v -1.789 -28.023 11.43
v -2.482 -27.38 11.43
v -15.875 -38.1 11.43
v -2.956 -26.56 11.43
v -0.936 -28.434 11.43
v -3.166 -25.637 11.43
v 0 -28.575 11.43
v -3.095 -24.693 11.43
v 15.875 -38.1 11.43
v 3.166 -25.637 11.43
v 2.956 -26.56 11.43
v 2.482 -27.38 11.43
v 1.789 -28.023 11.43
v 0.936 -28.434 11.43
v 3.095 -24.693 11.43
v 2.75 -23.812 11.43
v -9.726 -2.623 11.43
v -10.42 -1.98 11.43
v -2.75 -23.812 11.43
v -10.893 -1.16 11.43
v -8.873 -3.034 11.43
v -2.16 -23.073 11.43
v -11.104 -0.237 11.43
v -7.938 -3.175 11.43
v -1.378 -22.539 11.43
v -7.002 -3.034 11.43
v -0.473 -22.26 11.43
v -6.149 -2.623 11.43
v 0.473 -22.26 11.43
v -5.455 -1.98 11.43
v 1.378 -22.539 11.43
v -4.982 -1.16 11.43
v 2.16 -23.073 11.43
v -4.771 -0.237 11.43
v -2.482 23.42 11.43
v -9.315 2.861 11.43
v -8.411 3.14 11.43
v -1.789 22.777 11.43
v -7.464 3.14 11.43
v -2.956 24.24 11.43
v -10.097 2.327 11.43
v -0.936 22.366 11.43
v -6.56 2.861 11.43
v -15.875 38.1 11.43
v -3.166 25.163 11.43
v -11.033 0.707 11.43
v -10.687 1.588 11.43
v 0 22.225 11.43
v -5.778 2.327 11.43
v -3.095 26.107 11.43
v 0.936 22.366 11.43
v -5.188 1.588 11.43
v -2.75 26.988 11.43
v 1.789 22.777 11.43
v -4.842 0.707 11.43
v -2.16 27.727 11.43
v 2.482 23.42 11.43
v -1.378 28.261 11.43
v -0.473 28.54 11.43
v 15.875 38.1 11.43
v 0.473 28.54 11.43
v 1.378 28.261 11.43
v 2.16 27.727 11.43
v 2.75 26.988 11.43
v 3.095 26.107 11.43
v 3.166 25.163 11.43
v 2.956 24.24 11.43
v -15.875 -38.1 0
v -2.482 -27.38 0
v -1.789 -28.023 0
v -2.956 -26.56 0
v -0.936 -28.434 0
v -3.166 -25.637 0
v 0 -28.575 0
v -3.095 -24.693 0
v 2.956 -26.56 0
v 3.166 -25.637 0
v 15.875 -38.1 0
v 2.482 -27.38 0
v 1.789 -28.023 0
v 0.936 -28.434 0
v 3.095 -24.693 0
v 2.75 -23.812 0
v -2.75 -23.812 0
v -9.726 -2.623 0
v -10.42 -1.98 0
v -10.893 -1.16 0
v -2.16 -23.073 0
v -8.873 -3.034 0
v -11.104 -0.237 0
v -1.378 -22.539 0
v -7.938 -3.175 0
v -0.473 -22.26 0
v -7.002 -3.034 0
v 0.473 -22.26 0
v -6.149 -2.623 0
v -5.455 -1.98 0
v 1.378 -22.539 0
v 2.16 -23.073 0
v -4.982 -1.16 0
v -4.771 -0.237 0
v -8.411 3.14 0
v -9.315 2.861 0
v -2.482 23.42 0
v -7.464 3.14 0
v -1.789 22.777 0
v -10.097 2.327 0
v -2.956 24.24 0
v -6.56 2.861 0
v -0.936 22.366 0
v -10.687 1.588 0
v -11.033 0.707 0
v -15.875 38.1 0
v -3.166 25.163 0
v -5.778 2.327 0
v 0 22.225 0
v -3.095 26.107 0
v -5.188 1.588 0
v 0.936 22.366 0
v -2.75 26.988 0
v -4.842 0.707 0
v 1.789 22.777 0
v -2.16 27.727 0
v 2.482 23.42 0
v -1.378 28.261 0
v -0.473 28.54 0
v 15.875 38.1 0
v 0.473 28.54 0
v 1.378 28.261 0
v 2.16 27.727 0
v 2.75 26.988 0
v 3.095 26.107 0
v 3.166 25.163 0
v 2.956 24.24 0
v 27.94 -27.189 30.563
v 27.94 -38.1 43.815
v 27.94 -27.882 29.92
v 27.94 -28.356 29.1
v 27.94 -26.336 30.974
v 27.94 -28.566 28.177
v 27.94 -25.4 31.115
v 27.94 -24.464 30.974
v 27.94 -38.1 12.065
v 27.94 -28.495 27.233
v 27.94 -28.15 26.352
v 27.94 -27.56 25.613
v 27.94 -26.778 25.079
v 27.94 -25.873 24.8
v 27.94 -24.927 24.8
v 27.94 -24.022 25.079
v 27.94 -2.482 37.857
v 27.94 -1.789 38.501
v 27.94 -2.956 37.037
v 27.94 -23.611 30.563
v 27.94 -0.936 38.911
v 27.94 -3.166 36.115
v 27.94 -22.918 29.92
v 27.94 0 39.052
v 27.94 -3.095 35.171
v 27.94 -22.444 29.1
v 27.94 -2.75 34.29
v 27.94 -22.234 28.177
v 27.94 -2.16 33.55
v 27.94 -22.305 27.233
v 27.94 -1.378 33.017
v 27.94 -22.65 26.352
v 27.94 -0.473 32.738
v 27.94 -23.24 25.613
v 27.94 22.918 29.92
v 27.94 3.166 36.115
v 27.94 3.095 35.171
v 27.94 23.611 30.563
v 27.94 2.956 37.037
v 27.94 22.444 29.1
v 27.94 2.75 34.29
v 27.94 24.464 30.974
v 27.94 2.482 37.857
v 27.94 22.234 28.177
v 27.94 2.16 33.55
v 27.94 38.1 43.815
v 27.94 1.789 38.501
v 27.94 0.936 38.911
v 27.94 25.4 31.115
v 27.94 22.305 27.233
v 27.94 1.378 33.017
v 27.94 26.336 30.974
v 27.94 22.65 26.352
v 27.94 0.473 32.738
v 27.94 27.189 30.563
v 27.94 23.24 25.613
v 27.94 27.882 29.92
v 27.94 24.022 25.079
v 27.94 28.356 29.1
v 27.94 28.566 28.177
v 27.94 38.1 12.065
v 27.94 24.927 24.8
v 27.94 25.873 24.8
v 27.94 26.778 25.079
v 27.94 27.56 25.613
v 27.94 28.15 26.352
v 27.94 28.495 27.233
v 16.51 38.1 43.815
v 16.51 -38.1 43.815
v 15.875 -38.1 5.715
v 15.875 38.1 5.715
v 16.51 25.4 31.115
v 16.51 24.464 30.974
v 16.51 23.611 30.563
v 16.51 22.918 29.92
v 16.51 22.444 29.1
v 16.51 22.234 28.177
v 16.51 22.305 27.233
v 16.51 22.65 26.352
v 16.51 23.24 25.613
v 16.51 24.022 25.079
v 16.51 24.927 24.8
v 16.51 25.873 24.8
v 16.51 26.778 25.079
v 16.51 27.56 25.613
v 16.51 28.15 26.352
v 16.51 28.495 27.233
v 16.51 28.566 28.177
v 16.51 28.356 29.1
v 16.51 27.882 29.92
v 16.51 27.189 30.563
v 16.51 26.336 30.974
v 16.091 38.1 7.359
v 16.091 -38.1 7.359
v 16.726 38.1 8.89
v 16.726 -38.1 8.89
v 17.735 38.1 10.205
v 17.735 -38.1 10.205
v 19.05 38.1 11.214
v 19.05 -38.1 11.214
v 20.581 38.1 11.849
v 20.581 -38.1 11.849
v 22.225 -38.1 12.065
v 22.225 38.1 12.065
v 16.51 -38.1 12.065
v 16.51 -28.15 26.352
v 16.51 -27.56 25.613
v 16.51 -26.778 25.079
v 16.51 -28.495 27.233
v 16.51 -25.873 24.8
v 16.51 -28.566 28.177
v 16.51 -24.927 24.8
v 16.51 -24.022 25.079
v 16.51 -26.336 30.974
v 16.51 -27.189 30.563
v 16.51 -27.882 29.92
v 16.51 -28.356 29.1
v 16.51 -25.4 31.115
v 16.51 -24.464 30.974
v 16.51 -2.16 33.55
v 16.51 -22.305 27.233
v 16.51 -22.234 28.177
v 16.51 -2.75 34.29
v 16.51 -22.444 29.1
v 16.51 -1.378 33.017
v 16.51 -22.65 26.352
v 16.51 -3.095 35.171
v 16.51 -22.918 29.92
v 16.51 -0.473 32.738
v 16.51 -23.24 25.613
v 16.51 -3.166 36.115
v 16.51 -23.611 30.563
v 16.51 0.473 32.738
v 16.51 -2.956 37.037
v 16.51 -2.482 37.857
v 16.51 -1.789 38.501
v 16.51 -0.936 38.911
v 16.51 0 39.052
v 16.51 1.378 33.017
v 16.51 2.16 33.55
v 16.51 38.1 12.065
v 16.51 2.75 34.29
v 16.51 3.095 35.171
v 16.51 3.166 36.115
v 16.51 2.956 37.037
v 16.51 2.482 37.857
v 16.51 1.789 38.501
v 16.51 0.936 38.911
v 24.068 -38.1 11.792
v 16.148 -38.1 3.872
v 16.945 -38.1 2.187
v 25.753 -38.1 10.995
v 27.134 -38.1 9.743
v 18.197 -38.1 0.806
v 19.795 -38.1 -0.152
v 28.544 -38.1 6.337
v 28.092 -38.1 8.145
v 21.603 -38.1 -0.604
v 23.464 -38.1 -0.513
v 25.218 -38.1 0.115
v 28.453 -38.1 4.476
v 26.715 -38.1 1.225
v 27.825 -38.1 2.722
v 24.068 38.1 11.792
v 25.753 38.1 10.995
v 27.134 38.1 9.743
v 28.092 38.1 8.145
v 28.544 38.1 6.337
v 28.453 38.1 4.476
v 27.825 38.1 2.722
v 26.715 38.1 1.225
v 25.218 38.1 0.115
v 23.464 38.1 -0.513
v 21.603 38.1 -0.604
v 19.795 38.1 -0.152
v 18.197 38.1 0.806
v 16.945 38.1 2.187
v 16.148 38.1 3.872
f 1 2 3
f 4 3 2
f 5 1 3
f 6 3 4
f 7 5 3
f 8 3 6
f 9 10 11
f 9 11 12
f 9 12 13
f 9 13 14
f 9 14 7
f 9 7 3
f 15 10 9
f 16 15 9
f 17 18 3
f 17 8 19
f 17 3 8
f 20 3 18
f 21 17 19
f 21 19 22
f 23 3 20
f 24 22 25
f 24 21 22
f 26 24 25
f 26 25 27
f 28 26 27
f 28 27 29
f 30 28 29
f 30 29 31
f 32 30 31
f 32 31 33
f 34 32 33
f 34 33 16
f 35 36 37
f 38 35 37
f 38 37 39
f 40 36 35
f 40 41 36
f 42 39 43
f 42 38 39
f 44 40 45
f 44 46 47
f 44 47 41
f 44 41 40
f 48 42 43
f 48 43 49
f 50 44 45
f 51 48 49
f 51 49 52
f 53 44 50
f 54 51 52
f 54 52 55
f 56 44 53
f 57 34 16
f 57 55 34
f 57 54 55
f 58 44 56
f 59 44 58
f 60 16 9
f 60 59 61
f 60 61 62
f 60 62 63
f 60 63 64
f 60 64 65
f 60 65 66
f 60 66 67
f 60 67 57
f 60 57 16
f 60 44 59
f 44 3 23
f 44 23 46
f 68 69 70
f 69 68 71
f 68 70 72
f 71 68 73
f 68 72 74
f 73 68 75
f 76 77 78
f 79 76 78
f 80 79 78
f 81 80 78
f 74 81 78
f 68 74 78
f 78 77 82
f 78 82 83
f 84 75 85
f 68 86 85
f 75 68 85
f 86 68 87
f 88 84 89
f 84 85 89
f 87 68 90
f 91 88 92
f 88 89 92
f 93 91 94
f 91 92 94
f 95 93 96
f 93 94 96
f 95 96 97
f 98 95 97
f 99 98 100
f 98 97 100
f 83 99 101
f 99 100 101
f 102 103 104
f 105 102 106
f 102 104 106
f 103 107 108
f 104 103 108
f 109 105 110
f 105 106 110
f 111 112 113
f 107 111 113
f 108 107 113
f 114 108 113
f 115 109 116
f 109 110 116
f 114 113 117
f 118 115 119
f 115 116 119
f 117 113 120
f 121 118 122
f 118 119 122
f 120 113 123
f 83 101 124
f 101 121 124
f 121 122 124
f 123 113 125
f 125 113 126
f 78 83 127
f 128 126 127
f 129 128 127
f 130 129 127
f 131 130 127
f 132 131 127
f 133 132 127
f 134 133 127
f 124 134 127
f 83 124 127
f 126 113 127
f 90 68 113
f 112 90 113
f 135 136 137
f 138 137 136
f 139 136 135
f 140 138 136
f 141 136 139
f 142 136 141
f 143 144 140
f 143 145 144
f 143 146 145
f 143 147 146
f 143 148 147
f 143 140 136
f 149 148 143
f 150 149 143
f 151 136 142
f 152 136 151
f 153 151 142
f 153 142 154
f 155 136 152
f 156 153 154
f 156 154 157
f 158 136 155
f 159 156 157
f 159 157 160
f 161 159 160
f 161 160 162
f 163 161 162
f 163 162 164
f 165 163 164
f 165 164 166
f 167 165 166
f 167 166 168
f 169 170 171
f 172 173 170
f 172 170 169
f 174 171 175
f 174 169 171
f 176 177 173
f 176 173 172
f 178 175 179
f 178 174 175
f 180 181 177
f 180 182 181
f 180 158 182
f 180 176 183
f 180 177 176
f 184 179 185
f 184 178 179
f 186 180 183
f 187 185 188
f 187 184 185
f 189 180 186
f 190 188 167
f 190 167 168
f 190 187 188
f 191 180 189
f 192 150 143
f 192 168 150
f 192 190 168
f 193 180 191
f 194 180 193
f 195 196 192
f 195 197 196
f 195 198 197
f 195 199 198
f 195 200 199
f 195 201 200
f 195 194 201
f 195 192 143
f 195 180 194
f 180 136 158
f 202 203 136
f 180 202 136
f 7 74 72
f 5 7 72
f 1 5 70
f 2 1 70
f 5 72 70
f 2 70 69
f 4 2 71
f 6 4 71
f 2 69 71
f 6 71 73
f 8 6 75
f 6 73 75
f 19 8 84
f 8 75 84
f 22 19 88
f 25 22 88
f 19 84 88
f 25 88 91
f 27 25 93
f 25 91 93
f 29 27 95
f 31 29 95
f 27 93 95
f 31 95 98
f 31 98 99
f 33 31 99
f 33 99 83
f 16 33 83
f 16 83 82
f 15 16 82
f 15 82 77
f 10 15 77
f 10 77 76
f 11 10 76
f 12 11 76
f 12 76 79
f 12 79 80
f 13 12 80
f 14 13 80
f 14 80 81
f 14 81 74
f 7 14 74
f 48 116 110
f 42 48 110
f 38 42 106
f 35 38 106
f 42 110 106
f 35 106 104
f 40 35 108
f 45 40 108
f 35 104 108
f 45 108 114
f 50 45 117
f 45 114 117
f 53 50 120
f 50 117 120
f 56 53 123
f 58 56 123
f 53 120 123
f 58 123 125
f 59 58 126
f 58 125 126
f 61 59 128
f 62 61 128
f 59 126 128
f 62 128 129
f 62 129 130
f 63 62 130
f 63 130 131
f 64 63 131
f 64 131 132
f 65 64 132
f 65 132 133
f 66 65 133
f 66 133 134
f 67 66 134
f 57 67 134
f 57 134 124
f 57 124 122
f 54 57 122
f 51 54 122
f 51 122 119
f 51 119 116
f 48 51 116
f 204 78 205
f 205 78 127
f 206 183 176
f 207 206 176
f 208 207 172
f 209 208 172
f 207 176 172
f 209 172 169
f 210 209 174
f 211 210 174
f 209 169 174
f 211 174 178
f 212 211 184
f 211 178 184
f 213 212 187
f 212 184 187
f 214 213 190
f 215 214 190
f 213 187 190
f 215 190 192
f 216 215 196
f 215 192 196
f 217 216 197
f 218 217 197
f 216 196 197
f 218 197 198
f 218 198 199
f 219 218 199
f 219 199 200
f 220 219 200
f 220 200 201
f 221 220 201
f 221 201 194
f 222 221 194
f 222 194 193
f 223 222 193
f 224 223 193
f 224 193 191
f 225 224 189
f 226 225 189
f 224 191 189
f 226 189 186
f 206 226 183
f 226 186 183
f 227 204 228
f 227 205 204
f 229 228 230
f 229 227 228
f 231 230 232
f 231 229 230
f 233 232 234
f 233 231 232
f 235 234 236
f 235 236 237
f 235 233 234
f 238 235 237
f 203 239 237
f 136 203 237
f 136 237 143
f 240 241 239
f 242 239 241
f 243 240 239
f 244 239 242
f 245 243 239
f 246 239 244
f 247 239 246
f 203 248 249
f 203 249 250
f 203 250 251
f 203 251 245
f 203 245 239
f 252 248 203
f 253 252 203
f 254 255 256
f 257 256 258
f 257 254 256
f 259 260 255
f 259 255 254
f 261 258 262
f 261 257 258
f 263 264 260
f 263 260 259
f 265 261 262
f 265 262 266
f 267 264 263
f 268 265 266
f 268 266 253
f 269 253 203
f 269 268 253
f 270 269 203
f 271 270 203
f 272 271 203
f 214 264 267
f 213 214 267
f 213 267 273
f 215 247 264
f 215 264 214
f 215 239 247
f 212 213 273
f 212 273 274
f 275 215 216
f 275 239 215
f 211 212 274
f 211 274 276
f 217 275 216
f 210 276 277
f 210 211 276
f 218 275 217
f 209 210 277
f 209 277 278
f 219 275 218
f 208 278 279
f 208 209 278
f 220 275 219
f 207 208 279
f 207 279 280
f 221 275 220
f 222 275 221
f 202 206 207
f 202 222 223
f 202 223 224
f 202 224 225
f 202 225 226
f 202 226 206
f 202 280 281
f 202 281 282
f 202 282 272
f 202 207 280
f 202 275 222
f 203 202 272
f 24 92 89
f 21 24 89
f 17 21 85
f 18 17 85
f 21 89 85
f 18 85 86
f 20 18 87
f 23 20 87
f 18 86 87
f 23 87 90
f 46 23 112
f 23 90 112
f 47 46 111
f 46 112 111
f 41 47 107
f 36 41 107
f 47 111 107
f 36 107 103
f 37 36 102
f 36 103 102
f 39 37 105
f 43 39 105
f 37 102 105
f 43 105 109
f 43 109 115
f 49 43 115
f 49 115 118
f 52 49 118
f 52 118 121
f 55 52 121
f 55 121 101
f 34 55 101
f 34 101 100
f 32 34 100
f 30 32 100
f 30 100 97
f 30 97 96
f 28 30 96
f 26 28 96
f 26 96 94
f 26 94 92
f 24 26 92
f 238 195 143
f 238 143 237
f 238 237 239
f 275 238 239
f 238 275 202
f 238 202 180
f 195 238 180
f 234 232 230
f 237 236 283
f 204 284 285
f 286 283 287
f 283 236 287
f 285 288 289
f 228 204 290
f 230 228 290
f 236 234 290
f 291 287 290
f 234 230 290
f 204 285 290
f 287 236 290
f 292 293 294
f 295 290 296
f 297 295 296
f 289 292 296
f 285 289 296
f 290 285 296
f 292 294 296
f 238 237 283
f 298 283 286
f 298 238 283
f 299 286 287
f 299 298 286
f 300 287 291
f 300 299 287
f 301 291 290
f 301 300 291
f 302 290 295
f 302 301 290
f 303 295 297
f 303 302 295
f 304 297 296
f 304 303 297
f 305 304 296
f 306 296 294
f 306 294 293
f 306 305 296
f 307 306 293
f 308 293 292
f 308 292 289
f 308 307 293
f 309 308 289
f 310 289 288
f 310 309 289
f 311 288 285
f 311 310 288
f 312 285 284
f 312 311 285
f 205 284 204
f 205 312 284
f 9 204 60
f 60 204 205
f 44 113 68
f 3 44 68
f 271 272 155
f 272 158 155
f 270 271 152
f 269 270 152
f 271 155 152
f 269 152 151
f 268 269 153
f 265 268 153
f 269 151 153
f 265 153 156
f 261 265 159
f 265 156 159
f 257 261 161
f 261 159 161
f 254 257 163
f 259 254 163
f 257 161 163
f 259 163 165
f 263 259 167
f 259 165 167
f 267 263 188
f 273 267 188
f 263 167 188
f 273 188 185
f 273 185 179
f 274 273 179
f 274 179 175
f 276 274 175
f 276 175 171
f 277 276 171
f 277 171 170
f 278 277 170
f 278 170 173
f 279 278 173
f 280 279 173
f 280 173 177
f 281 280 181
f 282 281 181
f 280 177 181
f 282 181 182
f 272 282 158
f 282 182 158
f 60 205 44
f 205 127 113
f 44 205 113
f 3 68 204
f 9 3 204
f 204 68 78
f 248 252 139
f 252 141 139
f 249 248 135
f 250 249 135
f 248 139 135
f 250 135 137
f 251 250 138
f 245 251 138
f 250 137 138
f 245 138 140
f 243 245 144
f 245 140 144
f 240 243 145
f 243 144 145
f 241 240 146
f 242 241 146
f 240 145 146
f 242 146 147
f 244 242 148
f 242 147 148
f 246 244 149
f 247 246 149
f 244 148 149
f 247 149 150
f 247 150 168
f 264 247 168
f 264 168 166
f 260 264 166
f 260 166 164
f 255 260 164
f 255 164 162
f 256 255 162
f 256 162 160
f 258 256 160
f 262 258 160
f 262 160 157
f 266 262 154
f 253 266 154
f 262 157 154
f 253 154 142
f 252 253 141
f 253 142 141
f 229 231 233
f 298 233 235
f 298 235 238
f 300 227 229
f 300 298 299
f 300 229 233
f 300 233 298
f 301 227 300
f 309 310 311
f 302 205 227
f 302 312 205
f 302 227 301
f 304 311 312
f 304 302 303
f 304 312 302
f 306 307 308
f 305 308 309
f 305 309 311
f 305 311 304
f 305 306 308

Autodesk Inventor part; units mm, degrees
ref_plane "YZ Plane" through (0, 0, 0) normal (1, 0, 0) x (0, 1, 0)
ref_plane "XZ Plane" through (0, 0, 0) normal (0, 1, 0) x (-1, 0, 0)
ref_plane "XY Plane" through (0, 0, 0) normal (0, 0, 1) x (1, 0, 0)
sketch "Sketch1" plane through (0, 0, 0) normal (0, 0, 1) x (1, 0, 0)
  line L0 (-15.875, -38.1) -> (15.875, -38.1)
  line L1 (15.875, -38.1) -> (15.875, 38.1)
  line L2 (15.875, 38.1) -> (-15.875, 38.1)
  line L3 (-15.875, 38.1) -> (-15.875, -38.1)
  line L4 (-15.875, -38.1) -> (15.875, 38.1) construction
  line L5 (15.875, -38.1) -> (-15.875, 38.1) construction
  point P0 (0, 0)
  dimension "d0" = 76.2
  dimension "d1" = 31.75
extrude "Extrusion1" add sketch "Sketch1" along normal blind 11.43
sketch "Sketch2" plane through (-15.875, 38.1, 0) normal (0, 1, 0) x (1, 0, 0)
  circle A0 centre (38.1, -5.715) radius 6.35
  line L0 (0, 0) -> (0, -11.43) projected
  line L1 (31.75, 0) -> (31.75, -11.43) projected
  line L2 (32.385, -43.815) -> (43.815, -43.815)
  line L3 (43.815, -43.815) -> (43.815, -12.065)
  line L4 (43.815, -12.065) -> (32.385, -12.065)
  line L5 (32.385, -12.065) -> (32.385, -43.815)
  line L6 (32.385, -43.815) -> (43.815, -12.065) construction
  line L7 (43.815, -43.815) -> (32.385, -12.065) construction
  point P0 (15.875, 0)
  point P1 (0, -5.715)
  point P2 (31.75, -5.715)
  point P3 (31.75, -5.715)
  point P4 (38.1, -27.94)
  point P5 (38.1, -12.065)
  point P6 (31.75, -5.715)
  point P7 (38.1, -27.94)
  dimension "d4" = 12.7
  dimension "d5" = 31.75
  dimension "d6" = 11.43
extrude "Extrusion2" add sketch "Sketch2" against normal blind 76.2
sketch "Sketch3" plane through (0, 0, 11.43) normal (0, 0, 1) x (1, 0, 0)
  circle A0 centre (-7.9375, 0) radius 3.175
  circle A1 centre (0, 25.4) radius 3.175
  circle A2 centre (0, -25.4) radius 3.175
  point P0 (0, 0)
  dimension "d9" = 6.35
  dimension "d10" = 7.9375
  dimension "d11" = 6.35
  dimension "d12" = 6.35
  dimension "d13" = 25.4
  dimension "d14" = 25.4
sketch "Sketch4" plane through (16.51, 38.1, 12.065) normal (-1, 0, 0) x (0, 0, 1)
  circle A0 centre (23.8125, -38.1) radius 3.175
  circle A1 centre (15.875, -12.7) radius 3.175
  circle A2 centre (15.875, -63.5) radius 3.175
  line L0 (31.75, 0) -> (31.75, -76.2) projected
  line L1 (0, 0) -> (31.75, 0) projected
  line L2 (31.75, -76.2) -> (0, -76.2) projected
  line L3 (15.875, 0) -> (15.875, -76.2)
  line L4 (0, -76.2) -> (31.75, -76.2) projected
  line L5 (31.75, -38.1) -> (0.7842, -38.1)
  point P0 (-12.065, -38.1)
  dimension "d15" = 6.35
  dimension "d16" = 7.9375
  dimension "d17" = 25.4
  dimension "d18" = 25.4
  dimension "d19" = 6.35
  dimension "d20" = 6.35
hole "Hole1" at (0, 25.4, 11.43) at (-7.9375, 0, 11.43) at (0, -25.4, 11.43) direction (0, 0, -1) diameter 6.35 depth 25.4 tip angle 118
hole "Hole2" at (16.51, 0, 35.8775) at (16.51, -25.4, 27.94) at (16.51, 25.4, 27.94) direction (1, 0, 0) diameter 6.35 depth 25.4 tip angle 118
properties part number "hinges (for assembly)"
